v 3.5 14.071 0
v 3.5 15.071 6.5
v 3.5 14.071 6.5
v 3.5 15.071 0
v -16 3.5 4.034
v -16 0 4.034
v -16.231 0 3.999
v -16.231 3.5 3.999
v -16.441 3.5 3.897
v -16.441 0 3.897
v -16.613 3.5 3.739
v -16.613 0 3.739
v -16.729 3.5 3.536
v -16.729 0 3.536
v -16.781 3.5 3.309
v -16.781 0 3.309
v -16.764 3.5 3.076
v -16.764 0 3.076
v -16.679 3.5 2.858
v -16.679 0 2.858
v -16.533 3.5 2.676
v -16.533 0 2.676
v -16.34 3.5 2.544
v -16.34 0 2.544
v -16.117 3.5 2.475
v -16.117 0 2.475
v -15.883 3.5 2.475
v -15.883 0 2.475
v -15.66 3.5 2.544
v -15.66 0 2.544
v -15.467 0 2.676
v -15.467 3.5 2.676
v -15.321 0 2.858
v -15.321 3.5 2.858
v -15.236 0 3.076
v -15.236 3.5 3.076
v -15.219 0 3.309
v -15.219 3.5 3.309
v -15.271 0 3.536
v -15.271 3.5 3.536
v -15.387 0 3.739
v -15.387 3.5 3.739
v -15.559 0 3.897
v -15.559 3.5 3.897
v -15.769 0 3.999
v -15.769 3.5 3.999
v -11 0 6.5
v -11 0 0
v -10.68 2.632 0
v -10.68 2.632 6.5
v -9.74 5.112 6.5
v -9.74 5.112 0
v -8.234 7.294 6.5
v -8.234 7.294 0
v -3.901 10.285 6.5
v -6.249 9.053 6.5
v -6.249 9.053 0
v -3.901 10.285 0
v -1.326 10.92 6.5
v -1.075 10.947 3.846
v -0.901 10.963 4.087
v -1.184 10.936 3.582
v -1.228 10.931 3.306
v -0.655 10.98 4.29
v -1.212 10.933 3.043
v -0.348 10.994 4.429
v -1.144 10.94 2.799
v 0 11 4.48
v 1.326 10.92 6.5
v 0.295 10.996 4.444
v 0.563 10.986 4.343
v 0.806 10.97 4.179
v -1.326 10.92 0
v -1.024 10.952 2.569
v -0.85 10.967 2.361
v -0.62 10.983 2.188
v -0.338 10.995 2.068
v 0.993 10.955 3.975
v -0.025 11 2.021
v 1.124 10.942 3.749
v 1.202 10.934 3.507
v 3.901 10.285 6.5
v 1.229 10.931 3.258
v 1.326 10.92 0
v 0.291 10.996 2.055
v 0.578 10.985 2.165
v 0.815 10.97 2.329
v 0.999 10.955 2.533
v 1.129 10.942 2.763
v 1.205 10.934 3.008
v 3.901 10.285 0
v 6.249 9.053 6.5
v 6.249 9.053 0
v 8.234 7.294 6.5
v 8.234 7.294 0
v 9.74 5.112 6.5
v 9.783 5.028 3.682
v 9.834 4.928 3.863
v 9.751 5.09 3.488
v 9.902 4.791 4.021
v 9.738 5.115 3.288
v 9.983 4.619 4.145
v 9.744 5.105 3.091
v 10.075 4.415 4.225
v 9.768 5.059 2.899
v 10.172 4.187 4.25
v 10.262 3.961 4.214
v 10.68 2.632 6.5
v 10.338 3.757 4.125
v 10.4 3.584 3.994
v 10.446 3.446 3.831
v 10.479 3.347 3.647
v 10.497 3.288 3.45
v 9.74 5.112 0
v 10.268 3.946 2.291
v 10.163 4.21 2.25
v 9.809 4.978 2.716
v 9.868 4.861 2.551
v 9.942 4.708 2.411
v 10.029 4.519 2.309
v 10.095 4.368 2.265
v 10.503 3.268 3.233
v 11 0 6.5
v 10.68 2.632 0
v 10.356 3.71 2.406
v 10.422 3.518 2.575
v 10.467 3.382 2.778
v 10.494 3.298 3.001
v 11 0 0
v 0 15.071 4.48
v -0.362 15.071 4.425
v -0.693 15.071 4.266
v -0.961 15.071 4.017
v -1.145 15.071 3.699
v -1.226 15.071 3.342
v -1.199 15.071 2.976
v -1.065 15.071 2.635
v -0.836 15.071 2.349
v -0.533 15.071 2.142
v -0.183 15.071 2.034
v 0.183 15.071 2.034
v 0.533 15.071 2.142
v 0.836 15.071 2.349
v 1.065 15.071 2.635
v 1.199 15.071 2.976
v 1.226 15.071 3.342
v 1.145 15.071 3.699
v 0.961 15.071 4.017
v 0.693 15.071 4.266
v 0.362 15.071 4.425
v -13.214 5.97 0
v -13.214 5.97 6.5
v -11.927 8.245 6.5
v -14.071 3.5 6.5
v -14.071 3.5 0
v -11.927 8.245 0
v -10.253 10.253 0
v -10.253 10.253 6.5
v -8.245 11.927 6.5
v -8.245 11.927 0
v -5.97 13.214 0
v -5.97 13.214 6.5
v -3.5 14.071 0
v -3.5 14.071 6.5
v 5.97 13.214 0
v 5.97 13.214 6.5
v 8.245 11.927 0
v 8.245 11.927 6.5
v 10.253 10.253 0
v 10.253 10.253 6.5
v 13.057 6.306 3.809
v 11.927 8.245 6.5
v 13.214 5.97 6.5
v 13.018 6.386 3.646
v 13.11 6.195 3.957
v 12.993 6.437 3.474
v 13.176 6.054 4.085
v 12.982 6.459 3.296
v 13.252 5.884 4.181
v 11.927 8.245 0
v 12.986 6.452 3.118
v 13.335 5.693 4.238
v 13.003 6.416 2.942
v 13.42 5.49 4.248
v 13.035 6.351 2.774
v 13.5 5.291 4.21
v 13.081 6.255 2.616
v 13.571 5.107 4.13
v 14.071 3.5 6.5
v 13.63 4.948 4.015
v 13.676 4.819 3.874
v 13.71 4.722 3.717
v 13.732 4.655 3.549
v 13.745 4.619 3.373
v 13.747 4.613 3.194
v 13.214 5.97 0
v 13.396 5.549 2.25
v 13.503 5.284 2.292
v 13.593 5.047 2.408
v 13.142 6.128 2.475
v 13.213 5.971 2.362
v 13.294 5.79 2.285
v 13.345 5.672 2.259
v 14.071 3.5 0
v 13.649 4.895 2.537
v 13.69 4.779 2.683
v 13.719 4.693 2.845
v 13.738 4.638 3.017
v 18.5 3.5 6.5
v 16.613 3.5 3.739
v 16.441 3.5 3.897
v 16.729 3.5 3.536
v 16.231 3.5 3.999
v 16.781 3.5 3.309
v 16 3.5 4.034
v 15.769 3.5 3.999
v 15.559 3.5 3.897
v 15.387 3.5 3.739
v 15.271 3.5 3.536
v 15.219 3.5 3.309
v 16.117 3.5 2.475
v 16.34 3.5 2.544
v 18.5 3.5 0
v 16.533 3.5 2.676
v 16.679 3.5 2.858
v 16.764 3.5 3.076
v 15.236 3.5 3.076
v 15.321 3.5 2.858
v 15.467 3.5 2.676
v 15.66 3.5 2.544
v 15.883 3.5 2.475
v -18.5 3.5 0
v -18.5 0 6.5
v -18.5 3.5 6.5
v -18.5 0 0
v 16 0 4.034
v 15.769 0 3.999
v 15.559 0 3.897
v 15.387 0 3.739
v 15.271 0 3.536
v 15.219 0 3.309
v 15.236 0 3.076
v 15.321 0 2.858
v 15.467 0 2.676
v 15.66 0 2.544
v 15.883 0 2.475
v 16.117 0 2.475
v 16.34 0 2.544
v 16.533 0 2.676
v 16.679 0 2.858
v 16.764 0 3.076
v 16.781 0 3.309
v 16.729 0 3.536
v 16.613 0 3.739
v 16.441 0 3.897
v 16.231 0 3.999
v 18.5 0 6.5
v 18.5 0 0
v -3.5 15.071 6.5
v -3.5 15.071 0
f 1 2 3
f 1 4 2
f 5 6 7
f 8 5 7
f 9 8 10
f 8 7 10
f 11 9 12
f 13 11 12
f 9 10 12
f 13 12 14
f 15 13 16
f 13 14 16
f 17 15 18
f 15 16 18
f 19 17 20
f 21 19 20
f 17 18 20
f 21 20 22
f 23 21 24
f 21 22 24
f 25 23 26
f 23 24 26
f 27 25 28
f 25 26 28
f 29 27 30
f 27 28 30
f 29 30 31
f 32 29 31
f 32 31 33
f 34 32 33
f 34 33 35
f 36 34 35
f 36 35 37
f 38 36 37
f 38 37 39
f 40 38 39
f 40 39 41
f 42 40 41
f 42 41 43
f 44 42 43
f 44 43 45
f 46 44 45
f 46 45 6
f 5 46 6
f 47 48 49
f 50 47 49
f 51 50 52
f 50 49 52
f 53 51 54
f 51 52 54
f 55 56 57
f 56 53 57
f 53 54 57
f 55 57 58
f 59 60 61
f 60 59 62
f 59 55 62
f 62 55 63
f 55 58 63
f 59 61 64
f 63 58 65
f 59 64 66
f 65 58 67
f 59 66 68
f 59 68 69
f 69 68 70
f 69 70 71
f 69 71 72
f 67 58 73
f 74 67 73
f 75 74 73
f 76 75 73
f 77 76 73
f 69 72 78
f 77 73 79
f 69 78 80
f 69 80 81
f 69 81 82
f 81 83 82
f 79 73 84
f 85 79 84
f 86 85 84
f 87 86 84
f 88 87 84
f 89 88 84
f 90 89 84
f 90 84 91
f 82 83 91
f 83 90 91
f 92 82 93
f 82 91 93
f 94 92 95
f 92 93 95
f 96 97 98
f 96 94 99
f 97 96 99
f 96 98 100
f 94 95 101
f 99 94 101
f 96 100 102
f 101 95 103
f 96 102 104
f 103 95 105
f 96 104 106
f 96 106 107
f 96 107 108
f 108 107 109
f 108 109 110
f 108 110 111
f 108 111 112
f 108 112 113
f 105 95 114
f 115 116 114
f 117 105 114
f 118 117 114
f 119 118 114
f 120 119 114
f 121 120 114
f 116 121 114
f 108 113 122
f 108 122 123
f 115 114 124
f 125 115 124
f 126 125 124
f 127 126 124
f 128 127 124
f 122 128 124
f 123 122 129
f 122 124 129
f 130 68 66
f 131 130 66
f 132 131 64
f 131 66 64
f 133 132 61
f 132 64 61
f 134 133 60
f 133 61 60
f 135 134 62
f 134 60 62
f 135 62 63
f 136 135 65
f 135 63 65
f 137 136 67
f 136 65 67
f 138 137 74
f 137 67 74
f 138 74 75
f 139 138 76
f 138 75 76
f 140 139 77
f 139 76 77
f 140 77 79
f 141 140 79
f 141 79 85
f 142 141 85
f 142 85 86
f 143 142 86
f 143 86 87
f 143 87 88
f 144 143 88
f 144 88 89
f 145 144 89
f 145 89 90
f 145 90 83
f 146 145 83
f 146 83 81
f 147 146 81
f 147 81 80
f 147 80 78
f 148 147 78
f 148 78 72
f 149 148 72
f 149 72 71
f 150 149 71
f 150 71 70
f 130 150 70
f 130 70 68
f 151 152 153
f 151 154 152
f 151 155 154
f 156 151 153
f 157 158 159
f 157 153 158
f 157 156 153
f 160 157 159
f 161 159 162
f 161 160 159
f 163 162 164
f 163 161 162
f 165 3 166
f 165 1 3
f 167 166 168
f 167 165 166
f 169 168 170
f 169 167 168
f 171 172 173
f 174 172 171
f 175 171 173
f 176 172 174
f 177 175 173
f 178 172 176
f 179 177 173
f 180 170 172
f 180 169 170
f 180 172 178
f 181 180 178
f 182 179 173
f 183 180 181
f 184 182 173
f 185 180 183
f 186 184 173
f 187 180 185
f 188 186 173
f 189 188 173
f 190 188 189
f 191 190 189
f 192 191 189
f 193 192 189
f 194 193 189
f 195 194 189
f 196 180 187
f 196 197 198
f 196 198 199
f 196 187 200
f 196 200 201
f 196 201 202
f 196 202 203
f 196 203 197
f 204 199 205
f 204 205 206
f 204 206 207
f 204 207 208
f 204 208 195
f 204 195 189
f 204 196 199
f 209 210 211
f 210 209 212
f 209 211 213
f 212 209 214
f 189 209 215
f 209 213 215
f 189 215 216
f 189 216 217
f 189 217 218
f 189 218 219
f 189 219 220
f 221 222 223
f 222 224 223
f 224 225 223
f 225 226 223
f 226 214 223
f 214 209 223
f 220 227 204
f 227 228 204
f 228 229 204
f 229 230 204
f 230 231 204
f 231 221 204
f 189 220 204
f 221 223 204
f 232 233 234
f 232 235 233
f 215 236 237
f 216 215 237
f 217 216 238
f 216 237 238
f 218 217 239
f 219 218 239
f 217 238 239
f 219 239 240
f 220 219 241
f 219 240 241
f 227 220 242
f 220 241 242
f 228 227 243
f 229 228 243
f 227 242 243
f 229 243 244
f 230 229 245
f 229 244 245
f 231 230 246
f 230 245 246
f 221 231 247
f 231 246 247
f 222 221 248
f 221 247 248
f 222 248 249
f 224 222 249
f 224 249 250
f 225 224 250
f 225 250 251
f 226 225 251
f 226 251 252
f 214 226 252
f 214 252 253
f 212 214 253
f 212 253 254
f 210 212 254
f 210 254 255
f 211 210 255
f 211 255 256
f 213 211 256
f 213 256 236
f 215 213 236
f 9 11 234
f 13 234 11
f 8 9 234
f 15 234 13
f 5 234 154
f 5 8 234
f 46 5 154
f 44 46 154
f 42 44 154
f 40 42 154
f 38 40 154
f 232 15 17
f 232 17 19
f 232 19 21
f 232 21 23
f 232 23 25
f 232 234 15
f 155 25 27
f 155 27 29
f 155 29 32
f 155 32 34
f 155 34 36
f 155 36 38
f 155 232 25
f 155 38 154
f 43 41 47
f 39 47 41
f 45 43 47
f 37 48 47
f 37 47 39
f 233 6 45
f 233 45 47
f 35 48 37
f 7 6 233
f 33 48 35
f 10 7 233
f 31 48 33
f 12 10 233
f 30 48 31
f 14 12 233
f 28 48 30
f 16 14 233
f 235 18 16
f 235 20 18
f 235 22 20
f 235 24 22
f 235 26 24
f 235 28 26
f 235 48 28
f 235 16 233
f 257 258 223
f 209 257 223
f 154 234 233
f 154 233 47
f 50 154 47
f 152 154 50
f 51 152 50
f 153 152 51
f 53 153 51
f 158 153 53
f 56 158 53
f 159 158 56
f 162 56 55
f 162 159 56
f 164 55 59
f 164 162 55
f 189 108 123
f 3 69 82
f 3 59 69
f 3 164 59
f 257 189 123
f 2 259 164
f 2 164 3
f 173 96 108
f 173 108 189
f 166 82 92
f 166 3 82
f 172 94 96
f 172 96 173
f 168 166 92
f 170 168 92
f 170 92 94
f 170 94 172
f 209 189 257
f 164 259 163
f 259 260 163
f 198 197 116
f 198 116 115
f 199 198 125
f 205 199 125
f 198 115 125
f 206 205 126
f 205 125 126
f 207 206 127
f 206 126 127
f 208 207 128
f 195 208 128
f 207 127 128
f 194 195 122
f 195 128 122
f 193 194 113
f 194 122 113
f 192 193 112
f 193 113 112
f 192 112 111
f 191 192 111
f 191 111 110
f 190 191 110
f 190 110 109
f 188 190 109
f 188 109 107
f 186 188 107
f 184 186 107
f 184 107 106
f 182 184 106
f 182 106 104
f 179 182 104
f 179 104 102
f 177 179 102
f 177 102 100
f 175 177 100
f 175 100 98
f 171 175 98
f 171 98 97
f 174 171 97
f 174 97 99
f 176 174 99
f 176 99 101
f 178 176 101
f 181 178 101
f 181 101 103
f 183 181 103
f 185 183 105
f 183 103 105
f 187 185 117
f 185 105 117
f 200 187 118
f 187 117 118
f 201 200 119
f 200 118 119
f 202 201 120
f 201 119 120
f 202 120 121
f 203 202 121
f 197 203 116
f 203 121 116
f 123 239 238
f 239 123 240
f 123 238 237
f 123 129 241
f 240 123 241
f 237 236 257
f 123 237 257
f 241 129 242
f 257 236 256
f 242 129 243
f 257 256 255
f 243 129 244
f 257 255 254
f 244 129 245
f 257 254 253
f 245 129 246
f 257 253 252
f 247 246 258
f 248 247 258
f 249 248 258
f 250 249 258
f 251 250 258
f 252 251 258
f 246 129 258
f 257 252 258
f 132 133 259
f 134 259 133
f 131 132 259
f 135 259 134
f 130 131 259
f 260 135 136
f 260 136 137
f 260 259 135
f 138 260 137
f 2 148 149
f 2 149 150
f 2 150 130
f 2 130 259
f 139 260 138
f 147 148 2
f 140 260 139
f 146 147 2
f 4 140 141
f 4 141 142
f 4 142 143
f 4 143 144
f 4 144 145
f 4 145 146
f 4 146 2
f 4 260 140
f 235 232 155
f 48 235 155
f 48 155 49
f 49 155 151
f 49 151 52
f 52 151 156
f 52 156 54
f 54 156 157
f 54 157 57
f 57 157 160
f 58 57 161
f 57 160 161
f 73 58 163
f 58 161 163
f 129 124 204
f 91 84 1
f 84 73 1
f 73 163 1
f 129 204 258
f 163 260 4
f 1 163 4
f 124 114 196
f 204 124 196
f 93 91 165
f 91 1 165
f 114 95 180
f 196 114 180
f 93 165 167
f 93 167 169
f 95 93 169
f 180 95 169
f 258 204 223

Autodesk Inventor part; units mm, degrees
ref_plane "YZ Plane" through (0, 0, 0) normal (1, 0, 0) x (0, 1, 0)
ref_plane "XZ Plane" through (0, 0, 0) normal (0, 1, 0) x (-1, 0, 0)
sketch "Sketch1" plane through (0, 0, 0) normal (0, 0, 1) x (1, 0, 0)
  arc A0 (11, 0) -> (-11, 0) centre (0, 0) ccw
  arc A1 (14.0712, 3.5) -> (-14.0712, 3.5) centre (0, 0) ccw
  line L0 (-11, 0) -> (-18.5, 0)
  line L1 (-18.5, 0) -> (-18.5, 3.5)
  line L2 (11, 0) -> (18.5, 0)
  line L3 (18.5, 0) -> (18.5, 3.5)
  line L4 (-18.5, 3.5) -> (-14.0712, 3.5)
  line L5 (18.5, 3.5) -> (14.0712, 3.5)
  line L6 (-3.5, 15.0712) -> (3.5, 15.0712)
  line L7 (3.5, 15.0712) -> (3.5, 14.0712)
  line L8 (-3.5, 15.0712) -> (-3.5, 14.0712)
  point P0 (0, 15.0712)
  dimension "d2" = 11
  dimension "d3" = 14.5
  dimension "d4" = 7.5
  dimension "d5" = 3.5
  dimension "d6" = 18.5
  dimension "d7" = 7
  dimension "d8" = 1
extrude "Extrusion1" add sketch "Sketch1" along normal blind 6.5
sketch "Sketch2" plane through (0, 0, 6.5) normal (0, 0, 1) x (1, 0, 0)
  line L0 (-18.5, 3.5) -> (-18.5, 0) projected
  line L1 (-18.5, 0) -> (-11, 0) projected
  arc A0 (11, 0) -> (-11, 0) centre (0, 0) ccw projected
  line L2 (11, 0) -> (18.5, 0) projected
  line L3 (18.5, 0) -> (18.5, 3.5) projected
  line L4 (18.5, 3.5) -> (14.0712, 3.5) projected
  arc A1 (14.0712, 3.5) -> (3.5, 14.0712) centre (0, 0) ccw projected
  line L5 (3.5, 14.0712) -> (3.5, 15.0712) projected
  line L6 (3.5, 15.0712) -> (-3.5, 15.0712) projected
  line L7 (-3.5, 15.0712) -> (-3.5, 14.0712) projected
  arc A2 (-3.5, 14.0712) -> (-14.0712, 3.5) centre (0, 0) ccw projected
  line L8 (-14.0712, 3.5) -> (-18.5, 3.5) projected
  line L9 (0, 0) -> (18.5, 0)
  line L10 (0, 0) -> (23.4857, 9.7281)
  dimension "d11" = 22.5
ref_plane "Work Plane2" through (11.866, 9.4714, 3.25) normal (0.9239, 0.3827, 0) x (-0.3827, 0.9239, 0)
ref_plane "Work Plane1" through (-11, 0, 3.25) normal (0.9239, 0.3827, 0) x (-0.3827, 0.9239, 0)
sketch "Sketch3" plane through (11.866, 9.4714, 3.25) normal (0.9239, 0.3827, 0) x (-0.3827, 0.9239, 0)
  line L0 (-4.2095, 3.25) -> (-11.2892, 3.25) projected
  line L1 (-6.3608, -3.25) -> (7.4512, -3.25) projected
  line L2 (7.4512, -3.25) -> (7.4512, 3.25) projected
  line L3 (-6.3608, 3.25) -> (7.4512, 3.25) projected
  line L4 (-6.3608, -3.25) -> (-6.3608, 3.25) projected
  line L5 (-11.2892, -3.25) -> (-8.0556, -3.25) projected
  line L6 (-8.0556, -3.25) -> (-8.0556, 3.25) projected
  line L7 (-11.2892, 3.25) -> (-8.0556, 3.25) projected
  line L8 (-11.2892, -3.25) -> (-11.2892, 3.25) projected
  line L9 (-8.0556, -3.25) -> (-6.3608, -3.25) projected
  line L10 (-6.3608, -3.25) -> (-6.3608, 3.25) projected
  line L11 (-8.0556, 3.25) -> (-6.3608, 3.25) projected
  line L12 (-8.0556, -3.25) -> (-8.0556, 3.25) projected
  point P0 (-4.2095, -3.25)
  point P1 (-4.2095, 0)
  point P2 (-4.2095, 3.25)
  dimension "d13" = 3.25
  dimension "d14" = 11.6608
hole "Hole1" at (13.4769, 5.5823, 3.25) direction (-0.9239, -0.3827, 0) diameter 2 end through all
sketch "Sketch4" plane through (-3.5, 15.0712, 0) normal (0, 1, 0) x (1, 0, 0)
  line L0 (7, 0) -> (0, 0) projected
  line L1 (-15, 0) -> (-15, -6.5) projected
  point P0 (3.5, 0)
  point P1 (3.5, -3.25)
  point P2 (-15, -3.25)
  dimension "d22" = 18.5
  dimension "d23" = 3.25
hole "Hole2" at (0, 15.0712, 3.25) direction (0, -1, 0) diameter 2.459 end through all thread size "M3x0.5" class "6H" standard "ANSI Metric M Profile"
sketch "Sketch5" plane through (-18.5, 3.5, 0) normal (0, 1, 0) x (1, 0, 0)
  line L0 (4.4288, 0) -> (0, 0) projected
  line L1 (0, 0) -> (0, -6.5) projected
  line L2 (37, 0) -> (37, -6.5) projected
  line L3 (37, 0) -> (32.5712, 0) projected
  point P0 (18.5, 0)
  point P1 (2.5, -3.25)
  point P2 (34.5, -3.25)
  point P3 (0, -3.25)
  dimension "d31" = 2.5
  dimension "d32" = 2.5
  dimension "d33" = 3.25
  dimension "d34" = 3.25
hole "Hole3" at (-16, 3.5, 3.25) at (16, 3.5, 3.25) direction (0, -1, 0) diameter 1.567 end through all thread size "M2x0.4" class "6H" standard "ANSI Metric M Profile"
properties part number "29 - Sheave Strap 1" material "Steel AISI 1020 107 HR"
